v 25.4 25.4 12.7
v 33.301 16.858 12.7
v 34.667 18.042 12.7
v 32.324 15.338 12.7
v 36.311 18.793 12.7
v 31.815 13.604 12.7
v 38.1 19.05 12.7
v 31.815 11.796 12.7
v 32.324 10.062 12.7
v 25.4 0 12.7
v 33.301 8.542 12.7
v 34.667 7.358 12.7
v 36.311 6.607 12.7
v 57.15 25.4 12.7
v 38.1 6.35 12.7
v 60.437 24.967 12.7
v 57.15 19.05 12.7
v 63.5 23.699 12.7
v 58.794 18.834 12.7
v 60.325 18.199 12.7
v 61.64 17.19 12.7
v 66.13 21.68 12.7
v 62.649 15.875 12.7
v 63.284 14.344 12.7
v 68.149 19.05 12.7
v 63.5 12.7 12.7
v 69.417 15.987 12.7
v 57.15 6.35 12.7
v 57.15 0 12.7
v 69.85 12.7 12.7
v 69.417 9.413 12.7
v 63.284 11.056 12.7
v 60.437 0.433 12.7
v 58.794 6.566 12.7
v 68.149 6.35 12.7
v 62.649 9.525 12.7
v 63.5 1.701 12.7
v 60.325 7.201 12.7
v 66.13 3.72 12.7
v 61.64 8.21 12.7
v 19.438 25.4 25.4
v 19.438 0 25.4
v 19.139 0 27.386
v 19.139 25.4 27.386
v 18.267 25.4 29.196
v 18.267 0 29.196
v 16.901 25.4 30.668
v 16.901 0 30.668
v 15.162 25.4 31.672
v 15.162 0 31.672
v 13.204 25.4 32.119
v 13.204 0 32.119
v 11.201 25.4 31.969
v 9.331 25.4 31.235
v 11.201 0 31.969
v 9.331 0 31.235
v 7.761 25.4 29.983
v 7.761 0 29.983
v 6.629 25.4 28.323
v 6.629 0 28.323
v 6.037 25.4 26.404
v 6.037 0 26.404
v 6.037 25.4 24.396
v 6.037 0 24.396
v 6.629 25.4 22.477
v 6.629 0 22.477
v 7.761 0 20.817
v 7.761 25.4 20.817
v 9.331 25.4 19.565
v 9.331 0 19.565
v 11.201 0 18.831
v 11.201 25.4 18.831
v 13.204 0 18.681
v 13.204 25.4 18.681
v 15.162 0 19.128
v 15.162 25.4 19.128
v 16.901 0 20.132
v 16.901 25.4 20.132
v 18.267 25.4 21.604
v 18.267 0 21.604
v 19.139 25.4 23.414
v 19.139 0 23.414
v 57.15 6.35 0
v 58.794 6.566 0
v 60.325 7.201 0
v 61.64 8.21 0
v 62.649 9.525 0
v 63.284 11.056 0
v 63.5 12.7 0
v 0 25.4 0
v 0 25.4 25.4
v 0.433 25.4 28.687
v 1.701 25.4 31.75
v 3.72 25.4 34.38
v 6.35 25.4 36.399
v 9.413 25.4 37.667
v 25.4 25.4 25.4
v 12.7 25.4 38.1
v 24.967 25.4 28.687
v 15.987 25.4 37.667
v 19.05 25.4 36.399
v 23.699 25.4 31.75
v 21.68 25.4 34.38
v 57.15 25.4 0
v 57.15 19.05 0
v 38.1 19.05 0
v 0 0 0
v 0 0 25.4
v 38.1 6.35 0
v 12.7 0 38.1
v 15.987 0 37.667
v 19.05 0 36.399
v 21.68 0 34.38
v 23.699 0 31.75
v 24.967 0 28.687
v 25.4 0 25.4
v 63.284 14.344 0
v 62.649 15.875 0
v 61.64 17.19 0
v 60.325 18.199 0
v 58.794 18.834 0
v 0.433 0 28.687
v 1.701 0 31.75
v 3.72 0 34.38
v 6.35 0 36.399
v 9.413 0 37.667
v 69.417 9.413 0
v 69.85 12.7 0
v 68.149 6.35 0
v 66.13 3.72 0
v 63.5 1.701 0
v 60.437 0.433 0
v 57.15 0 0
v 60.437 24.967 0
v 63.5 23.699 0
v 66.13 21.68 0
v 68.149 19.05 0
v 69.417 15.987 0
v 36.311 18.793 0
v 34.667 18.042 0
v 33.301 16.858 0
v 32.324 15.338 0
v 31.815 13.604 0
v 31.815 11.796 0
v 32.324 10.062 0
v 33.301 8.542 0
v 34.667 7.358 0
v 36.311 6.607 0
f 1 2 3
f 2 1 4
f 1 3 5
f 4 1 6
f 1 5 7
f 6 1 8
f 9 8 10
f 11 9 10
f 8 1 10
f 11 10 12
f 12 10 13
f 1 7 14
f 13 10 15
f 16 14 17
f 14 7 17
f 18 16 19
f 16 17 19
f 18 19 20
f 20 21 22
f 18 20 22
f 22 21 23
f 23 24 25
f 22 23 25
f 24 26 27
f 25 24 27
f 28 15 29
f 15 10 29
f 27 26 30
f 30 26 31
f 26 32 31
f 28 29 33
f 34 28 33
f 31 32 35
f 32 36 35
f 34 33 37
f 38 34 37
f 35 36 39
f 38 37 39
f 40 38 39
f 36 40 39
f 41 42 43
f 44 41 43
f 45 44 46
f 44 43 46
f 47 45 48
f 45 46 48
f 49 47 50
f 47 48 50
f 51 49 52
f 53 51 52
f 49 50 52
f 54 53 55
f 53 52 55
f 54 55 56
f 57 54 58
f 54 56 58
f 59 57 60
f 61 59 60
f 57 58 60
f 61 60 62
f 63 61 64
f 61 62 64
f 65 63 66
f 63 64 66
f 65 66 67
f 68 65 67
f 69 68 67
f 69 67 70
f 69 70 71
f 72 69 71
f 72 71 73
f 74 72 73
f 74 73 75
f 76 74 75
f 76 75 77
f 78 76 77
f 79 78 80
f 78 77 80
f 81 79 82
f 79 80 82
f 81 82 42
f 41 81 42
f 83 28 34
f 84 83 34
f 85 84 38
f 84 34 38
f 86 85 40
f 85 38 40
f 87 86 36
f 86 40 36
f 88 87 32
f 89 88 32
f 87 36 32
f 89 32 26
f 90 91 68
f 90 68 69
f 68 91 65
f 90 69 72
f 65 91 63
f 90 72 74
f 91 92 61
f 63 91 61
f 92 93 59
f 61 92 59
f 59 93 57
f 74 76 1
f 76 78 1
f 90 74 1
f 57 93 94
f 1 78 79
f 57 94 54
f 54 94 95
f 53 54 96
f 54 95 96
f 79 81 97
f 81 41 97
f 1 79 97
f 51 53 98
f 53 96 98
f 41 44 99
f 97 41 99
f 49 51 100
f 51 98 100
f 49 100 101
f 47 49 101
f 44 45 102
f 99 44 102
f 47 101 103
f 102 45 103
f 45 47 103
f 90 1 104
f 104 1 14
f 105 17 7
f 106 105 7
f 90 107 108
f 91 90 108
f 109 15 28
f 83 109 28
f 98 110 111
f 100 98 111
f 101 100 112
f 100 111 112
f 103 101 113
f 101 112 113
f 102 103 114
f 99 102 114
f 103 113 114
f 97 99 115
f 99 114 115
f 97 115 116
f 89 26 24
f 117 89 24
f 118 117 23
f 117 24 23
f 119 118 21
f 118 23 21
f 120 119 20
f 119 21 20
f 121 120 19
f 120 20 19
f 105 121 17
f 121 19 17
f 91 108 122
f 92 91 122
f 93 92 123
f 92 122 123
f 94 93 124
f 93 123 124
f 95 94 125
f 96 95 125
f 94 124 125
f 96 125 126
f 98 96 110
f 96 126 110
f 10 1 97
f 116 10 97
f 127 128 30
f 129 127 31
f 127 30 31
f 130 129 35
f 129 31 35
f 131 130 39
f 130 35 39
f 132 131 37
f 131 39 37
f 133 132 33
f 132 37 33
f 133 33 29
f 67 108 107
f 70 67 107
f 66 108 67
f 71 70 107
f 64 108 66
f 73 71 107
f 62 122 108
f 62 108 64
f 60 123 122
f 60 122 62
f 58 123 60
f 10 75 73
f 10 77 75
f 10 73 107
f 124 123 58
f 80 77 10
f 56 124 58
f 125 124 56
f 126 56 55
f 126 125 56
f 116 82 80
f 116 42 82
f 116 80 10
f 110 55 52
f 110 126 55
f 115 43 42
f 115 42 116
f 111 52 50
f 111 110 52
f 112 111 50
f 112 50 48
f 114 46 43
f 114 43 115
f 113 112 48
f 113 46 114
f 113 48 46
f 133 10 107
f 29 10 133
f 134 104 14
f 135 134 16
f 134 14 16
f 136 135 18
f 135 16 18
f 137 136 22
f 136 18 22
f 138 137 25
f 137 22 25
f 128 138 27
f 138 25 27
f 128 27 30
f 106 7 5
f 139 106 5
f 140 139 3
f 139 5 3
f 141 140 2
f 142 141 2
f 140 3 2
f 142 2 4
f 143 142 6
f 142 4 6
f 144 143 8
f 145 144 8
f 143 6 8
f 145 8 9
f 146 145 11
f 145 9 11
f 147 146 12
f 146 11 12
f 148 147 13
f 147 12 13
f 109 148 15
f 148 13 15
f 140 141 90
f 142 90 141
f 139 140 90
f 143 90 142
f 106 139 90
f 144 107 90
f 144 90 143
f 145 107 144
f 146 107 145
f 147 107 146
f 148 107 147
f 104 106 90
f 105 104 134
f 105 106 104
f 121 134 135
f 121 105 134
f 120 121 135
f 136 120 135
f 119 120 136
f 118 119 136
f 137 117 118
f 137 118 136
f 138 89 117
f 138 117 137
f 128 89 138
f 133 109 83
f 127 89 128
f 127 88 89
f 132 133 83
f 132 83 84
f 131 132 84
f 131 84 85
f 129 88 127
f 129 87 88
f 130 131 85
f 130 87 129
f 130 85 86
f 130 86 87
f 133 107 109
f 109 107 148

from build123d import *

# Parameters (mm, degrees)
F0_W      = 69.85
F0_H      = 38.1
F1_DEPTH  = 25.4
F2_W      = 44.45
F2_H      = 25.4
F3_DEPTH  = 25.4
F5_DEPTH  = 25.4
F7_DEPTH  = 25.4
F8_R      = 6.7378707766
F9_DEPTH  = 25.4
F11_DEPTH = 25.4


with BuildPart() as f1:
    # F0 (on Front) → F1 (new body)
    with BuildSketch(Plane.XZ):
        with Locations((34.925, 19.05)):
            Rectangle(F0_W, F0_H)
    extrude(amount=-F1_DEPTH)

    # F2 (on face) → F3 (cut)
    with BuildSketch(Plane.XZ):
        with Locations((47.625, 25.4)):
            Rectangle(F2_W, F2_H)
    extrude(amount=-F3_DEPTH, mode=Mode.SUBTRACT)

    # F4 (on face) → F5 (cut)
    with BuildSketch(Plane.XY.offset(12.7)):
        with BuildLine():
            ThreePointArc((38.1, 6.35), (42.5901280605, 8.2098719395), (44.45, 12.7))
            ThreePointArc((44.45, 12.7), (42.5901280605, 17.1901280605), (38.1, 19.05))
            ThreePointArc((38.1, 19.05), (31.75, 12.7), (38.1, 6.35))
        make_face()
        with BuildLine():
            ThreePointArc((38.1, 19.05), (42.5901280605, 17.1901280605), (44.45, 12.7))
            ThreePointArc((44.45, 12.7), (42.5901280605, 8.2098719395), (38.1, 6.35))
            Line((38.1, 6.35), (57.15, 6.35))
            ThreePointArc((57.15, 6.35), (50.8, 12.7), (57.15, 19.05))
            Line((57.15, 19.05), (38.1, 19.05))
        make_face()
        with BuildLine():
            ThreePointArc((63.5, 12.7), (61.6401280605, 17.1901280605), (57.15, 19.05))
            ThreePointArc((57.15, 19.05), (50.8, 12.7), (57.15, 6.35))
            ThreePointArc((57.15, 6.35), (61.6401280605, 8.2098719395), (63.5, 12.7))
        make_face()
    extrude(amount=-F5_DEPTH, mode=Mode.SUBTRACT)

    # F6 (on face) → F7 (cut)
    with BuildSketch(Plane.XY.offset(12.7)):
        with BuildLine():
            ThreePointArc((57.15, 25.4), (66.1302561211, 21.6802561211), (69.85, 12.7))
            Line((69.85, 12.7), (69.85, 25.4))
            Line((69.85, 25.4), (57.15, 25.4))
        make_face()
        with BuildLine():
            ThreePointArc((69.85, 12.7), (66.1302561211, 3.7197438789), (57.15, 0))
            Line((57.15, 0), (69.85, 0))
            Line((69.85, 0), (69.85, 12.7))
        make_face()
    extrude(amount=-F7_DEPTH, mode=Mode.SUBTRACT)

    # F8 (on face) → F9 (cut)
    with BuildSketch(Plane.XZ):
        with Locations((12.7, 25.4)):
            Circle(F8_R)
    extrude(amount=-F9_DEPTH, mode=Mode.SUBTRACT)

    # F10 (on face) → F11 (cut)
    with BuildSketch(Plane.XZ):
        with BuildLine():
            ThreePointArc((0, 25.4), (3.7197438789, 34.3802561211), (12.7, 38.1))
            Line((12.7, 38.1), (0, 38.1))
            Line((0, 38.1), (0, 25.4))
        make_face()
        with BuildLine():
            ThreePointArc((12.7, 38.1), (21.6802561211, 34.3802561211), (25.4, 25.4))
            Line((25.4, 25.4), (25.4, 38.1))
            Line((25.4, 38.1), (12.7, 38.1))
        make_face()
    extrude(amount=-F11_DEPTH, mode=Mode.SUBTRACT)


solid = f1.part
